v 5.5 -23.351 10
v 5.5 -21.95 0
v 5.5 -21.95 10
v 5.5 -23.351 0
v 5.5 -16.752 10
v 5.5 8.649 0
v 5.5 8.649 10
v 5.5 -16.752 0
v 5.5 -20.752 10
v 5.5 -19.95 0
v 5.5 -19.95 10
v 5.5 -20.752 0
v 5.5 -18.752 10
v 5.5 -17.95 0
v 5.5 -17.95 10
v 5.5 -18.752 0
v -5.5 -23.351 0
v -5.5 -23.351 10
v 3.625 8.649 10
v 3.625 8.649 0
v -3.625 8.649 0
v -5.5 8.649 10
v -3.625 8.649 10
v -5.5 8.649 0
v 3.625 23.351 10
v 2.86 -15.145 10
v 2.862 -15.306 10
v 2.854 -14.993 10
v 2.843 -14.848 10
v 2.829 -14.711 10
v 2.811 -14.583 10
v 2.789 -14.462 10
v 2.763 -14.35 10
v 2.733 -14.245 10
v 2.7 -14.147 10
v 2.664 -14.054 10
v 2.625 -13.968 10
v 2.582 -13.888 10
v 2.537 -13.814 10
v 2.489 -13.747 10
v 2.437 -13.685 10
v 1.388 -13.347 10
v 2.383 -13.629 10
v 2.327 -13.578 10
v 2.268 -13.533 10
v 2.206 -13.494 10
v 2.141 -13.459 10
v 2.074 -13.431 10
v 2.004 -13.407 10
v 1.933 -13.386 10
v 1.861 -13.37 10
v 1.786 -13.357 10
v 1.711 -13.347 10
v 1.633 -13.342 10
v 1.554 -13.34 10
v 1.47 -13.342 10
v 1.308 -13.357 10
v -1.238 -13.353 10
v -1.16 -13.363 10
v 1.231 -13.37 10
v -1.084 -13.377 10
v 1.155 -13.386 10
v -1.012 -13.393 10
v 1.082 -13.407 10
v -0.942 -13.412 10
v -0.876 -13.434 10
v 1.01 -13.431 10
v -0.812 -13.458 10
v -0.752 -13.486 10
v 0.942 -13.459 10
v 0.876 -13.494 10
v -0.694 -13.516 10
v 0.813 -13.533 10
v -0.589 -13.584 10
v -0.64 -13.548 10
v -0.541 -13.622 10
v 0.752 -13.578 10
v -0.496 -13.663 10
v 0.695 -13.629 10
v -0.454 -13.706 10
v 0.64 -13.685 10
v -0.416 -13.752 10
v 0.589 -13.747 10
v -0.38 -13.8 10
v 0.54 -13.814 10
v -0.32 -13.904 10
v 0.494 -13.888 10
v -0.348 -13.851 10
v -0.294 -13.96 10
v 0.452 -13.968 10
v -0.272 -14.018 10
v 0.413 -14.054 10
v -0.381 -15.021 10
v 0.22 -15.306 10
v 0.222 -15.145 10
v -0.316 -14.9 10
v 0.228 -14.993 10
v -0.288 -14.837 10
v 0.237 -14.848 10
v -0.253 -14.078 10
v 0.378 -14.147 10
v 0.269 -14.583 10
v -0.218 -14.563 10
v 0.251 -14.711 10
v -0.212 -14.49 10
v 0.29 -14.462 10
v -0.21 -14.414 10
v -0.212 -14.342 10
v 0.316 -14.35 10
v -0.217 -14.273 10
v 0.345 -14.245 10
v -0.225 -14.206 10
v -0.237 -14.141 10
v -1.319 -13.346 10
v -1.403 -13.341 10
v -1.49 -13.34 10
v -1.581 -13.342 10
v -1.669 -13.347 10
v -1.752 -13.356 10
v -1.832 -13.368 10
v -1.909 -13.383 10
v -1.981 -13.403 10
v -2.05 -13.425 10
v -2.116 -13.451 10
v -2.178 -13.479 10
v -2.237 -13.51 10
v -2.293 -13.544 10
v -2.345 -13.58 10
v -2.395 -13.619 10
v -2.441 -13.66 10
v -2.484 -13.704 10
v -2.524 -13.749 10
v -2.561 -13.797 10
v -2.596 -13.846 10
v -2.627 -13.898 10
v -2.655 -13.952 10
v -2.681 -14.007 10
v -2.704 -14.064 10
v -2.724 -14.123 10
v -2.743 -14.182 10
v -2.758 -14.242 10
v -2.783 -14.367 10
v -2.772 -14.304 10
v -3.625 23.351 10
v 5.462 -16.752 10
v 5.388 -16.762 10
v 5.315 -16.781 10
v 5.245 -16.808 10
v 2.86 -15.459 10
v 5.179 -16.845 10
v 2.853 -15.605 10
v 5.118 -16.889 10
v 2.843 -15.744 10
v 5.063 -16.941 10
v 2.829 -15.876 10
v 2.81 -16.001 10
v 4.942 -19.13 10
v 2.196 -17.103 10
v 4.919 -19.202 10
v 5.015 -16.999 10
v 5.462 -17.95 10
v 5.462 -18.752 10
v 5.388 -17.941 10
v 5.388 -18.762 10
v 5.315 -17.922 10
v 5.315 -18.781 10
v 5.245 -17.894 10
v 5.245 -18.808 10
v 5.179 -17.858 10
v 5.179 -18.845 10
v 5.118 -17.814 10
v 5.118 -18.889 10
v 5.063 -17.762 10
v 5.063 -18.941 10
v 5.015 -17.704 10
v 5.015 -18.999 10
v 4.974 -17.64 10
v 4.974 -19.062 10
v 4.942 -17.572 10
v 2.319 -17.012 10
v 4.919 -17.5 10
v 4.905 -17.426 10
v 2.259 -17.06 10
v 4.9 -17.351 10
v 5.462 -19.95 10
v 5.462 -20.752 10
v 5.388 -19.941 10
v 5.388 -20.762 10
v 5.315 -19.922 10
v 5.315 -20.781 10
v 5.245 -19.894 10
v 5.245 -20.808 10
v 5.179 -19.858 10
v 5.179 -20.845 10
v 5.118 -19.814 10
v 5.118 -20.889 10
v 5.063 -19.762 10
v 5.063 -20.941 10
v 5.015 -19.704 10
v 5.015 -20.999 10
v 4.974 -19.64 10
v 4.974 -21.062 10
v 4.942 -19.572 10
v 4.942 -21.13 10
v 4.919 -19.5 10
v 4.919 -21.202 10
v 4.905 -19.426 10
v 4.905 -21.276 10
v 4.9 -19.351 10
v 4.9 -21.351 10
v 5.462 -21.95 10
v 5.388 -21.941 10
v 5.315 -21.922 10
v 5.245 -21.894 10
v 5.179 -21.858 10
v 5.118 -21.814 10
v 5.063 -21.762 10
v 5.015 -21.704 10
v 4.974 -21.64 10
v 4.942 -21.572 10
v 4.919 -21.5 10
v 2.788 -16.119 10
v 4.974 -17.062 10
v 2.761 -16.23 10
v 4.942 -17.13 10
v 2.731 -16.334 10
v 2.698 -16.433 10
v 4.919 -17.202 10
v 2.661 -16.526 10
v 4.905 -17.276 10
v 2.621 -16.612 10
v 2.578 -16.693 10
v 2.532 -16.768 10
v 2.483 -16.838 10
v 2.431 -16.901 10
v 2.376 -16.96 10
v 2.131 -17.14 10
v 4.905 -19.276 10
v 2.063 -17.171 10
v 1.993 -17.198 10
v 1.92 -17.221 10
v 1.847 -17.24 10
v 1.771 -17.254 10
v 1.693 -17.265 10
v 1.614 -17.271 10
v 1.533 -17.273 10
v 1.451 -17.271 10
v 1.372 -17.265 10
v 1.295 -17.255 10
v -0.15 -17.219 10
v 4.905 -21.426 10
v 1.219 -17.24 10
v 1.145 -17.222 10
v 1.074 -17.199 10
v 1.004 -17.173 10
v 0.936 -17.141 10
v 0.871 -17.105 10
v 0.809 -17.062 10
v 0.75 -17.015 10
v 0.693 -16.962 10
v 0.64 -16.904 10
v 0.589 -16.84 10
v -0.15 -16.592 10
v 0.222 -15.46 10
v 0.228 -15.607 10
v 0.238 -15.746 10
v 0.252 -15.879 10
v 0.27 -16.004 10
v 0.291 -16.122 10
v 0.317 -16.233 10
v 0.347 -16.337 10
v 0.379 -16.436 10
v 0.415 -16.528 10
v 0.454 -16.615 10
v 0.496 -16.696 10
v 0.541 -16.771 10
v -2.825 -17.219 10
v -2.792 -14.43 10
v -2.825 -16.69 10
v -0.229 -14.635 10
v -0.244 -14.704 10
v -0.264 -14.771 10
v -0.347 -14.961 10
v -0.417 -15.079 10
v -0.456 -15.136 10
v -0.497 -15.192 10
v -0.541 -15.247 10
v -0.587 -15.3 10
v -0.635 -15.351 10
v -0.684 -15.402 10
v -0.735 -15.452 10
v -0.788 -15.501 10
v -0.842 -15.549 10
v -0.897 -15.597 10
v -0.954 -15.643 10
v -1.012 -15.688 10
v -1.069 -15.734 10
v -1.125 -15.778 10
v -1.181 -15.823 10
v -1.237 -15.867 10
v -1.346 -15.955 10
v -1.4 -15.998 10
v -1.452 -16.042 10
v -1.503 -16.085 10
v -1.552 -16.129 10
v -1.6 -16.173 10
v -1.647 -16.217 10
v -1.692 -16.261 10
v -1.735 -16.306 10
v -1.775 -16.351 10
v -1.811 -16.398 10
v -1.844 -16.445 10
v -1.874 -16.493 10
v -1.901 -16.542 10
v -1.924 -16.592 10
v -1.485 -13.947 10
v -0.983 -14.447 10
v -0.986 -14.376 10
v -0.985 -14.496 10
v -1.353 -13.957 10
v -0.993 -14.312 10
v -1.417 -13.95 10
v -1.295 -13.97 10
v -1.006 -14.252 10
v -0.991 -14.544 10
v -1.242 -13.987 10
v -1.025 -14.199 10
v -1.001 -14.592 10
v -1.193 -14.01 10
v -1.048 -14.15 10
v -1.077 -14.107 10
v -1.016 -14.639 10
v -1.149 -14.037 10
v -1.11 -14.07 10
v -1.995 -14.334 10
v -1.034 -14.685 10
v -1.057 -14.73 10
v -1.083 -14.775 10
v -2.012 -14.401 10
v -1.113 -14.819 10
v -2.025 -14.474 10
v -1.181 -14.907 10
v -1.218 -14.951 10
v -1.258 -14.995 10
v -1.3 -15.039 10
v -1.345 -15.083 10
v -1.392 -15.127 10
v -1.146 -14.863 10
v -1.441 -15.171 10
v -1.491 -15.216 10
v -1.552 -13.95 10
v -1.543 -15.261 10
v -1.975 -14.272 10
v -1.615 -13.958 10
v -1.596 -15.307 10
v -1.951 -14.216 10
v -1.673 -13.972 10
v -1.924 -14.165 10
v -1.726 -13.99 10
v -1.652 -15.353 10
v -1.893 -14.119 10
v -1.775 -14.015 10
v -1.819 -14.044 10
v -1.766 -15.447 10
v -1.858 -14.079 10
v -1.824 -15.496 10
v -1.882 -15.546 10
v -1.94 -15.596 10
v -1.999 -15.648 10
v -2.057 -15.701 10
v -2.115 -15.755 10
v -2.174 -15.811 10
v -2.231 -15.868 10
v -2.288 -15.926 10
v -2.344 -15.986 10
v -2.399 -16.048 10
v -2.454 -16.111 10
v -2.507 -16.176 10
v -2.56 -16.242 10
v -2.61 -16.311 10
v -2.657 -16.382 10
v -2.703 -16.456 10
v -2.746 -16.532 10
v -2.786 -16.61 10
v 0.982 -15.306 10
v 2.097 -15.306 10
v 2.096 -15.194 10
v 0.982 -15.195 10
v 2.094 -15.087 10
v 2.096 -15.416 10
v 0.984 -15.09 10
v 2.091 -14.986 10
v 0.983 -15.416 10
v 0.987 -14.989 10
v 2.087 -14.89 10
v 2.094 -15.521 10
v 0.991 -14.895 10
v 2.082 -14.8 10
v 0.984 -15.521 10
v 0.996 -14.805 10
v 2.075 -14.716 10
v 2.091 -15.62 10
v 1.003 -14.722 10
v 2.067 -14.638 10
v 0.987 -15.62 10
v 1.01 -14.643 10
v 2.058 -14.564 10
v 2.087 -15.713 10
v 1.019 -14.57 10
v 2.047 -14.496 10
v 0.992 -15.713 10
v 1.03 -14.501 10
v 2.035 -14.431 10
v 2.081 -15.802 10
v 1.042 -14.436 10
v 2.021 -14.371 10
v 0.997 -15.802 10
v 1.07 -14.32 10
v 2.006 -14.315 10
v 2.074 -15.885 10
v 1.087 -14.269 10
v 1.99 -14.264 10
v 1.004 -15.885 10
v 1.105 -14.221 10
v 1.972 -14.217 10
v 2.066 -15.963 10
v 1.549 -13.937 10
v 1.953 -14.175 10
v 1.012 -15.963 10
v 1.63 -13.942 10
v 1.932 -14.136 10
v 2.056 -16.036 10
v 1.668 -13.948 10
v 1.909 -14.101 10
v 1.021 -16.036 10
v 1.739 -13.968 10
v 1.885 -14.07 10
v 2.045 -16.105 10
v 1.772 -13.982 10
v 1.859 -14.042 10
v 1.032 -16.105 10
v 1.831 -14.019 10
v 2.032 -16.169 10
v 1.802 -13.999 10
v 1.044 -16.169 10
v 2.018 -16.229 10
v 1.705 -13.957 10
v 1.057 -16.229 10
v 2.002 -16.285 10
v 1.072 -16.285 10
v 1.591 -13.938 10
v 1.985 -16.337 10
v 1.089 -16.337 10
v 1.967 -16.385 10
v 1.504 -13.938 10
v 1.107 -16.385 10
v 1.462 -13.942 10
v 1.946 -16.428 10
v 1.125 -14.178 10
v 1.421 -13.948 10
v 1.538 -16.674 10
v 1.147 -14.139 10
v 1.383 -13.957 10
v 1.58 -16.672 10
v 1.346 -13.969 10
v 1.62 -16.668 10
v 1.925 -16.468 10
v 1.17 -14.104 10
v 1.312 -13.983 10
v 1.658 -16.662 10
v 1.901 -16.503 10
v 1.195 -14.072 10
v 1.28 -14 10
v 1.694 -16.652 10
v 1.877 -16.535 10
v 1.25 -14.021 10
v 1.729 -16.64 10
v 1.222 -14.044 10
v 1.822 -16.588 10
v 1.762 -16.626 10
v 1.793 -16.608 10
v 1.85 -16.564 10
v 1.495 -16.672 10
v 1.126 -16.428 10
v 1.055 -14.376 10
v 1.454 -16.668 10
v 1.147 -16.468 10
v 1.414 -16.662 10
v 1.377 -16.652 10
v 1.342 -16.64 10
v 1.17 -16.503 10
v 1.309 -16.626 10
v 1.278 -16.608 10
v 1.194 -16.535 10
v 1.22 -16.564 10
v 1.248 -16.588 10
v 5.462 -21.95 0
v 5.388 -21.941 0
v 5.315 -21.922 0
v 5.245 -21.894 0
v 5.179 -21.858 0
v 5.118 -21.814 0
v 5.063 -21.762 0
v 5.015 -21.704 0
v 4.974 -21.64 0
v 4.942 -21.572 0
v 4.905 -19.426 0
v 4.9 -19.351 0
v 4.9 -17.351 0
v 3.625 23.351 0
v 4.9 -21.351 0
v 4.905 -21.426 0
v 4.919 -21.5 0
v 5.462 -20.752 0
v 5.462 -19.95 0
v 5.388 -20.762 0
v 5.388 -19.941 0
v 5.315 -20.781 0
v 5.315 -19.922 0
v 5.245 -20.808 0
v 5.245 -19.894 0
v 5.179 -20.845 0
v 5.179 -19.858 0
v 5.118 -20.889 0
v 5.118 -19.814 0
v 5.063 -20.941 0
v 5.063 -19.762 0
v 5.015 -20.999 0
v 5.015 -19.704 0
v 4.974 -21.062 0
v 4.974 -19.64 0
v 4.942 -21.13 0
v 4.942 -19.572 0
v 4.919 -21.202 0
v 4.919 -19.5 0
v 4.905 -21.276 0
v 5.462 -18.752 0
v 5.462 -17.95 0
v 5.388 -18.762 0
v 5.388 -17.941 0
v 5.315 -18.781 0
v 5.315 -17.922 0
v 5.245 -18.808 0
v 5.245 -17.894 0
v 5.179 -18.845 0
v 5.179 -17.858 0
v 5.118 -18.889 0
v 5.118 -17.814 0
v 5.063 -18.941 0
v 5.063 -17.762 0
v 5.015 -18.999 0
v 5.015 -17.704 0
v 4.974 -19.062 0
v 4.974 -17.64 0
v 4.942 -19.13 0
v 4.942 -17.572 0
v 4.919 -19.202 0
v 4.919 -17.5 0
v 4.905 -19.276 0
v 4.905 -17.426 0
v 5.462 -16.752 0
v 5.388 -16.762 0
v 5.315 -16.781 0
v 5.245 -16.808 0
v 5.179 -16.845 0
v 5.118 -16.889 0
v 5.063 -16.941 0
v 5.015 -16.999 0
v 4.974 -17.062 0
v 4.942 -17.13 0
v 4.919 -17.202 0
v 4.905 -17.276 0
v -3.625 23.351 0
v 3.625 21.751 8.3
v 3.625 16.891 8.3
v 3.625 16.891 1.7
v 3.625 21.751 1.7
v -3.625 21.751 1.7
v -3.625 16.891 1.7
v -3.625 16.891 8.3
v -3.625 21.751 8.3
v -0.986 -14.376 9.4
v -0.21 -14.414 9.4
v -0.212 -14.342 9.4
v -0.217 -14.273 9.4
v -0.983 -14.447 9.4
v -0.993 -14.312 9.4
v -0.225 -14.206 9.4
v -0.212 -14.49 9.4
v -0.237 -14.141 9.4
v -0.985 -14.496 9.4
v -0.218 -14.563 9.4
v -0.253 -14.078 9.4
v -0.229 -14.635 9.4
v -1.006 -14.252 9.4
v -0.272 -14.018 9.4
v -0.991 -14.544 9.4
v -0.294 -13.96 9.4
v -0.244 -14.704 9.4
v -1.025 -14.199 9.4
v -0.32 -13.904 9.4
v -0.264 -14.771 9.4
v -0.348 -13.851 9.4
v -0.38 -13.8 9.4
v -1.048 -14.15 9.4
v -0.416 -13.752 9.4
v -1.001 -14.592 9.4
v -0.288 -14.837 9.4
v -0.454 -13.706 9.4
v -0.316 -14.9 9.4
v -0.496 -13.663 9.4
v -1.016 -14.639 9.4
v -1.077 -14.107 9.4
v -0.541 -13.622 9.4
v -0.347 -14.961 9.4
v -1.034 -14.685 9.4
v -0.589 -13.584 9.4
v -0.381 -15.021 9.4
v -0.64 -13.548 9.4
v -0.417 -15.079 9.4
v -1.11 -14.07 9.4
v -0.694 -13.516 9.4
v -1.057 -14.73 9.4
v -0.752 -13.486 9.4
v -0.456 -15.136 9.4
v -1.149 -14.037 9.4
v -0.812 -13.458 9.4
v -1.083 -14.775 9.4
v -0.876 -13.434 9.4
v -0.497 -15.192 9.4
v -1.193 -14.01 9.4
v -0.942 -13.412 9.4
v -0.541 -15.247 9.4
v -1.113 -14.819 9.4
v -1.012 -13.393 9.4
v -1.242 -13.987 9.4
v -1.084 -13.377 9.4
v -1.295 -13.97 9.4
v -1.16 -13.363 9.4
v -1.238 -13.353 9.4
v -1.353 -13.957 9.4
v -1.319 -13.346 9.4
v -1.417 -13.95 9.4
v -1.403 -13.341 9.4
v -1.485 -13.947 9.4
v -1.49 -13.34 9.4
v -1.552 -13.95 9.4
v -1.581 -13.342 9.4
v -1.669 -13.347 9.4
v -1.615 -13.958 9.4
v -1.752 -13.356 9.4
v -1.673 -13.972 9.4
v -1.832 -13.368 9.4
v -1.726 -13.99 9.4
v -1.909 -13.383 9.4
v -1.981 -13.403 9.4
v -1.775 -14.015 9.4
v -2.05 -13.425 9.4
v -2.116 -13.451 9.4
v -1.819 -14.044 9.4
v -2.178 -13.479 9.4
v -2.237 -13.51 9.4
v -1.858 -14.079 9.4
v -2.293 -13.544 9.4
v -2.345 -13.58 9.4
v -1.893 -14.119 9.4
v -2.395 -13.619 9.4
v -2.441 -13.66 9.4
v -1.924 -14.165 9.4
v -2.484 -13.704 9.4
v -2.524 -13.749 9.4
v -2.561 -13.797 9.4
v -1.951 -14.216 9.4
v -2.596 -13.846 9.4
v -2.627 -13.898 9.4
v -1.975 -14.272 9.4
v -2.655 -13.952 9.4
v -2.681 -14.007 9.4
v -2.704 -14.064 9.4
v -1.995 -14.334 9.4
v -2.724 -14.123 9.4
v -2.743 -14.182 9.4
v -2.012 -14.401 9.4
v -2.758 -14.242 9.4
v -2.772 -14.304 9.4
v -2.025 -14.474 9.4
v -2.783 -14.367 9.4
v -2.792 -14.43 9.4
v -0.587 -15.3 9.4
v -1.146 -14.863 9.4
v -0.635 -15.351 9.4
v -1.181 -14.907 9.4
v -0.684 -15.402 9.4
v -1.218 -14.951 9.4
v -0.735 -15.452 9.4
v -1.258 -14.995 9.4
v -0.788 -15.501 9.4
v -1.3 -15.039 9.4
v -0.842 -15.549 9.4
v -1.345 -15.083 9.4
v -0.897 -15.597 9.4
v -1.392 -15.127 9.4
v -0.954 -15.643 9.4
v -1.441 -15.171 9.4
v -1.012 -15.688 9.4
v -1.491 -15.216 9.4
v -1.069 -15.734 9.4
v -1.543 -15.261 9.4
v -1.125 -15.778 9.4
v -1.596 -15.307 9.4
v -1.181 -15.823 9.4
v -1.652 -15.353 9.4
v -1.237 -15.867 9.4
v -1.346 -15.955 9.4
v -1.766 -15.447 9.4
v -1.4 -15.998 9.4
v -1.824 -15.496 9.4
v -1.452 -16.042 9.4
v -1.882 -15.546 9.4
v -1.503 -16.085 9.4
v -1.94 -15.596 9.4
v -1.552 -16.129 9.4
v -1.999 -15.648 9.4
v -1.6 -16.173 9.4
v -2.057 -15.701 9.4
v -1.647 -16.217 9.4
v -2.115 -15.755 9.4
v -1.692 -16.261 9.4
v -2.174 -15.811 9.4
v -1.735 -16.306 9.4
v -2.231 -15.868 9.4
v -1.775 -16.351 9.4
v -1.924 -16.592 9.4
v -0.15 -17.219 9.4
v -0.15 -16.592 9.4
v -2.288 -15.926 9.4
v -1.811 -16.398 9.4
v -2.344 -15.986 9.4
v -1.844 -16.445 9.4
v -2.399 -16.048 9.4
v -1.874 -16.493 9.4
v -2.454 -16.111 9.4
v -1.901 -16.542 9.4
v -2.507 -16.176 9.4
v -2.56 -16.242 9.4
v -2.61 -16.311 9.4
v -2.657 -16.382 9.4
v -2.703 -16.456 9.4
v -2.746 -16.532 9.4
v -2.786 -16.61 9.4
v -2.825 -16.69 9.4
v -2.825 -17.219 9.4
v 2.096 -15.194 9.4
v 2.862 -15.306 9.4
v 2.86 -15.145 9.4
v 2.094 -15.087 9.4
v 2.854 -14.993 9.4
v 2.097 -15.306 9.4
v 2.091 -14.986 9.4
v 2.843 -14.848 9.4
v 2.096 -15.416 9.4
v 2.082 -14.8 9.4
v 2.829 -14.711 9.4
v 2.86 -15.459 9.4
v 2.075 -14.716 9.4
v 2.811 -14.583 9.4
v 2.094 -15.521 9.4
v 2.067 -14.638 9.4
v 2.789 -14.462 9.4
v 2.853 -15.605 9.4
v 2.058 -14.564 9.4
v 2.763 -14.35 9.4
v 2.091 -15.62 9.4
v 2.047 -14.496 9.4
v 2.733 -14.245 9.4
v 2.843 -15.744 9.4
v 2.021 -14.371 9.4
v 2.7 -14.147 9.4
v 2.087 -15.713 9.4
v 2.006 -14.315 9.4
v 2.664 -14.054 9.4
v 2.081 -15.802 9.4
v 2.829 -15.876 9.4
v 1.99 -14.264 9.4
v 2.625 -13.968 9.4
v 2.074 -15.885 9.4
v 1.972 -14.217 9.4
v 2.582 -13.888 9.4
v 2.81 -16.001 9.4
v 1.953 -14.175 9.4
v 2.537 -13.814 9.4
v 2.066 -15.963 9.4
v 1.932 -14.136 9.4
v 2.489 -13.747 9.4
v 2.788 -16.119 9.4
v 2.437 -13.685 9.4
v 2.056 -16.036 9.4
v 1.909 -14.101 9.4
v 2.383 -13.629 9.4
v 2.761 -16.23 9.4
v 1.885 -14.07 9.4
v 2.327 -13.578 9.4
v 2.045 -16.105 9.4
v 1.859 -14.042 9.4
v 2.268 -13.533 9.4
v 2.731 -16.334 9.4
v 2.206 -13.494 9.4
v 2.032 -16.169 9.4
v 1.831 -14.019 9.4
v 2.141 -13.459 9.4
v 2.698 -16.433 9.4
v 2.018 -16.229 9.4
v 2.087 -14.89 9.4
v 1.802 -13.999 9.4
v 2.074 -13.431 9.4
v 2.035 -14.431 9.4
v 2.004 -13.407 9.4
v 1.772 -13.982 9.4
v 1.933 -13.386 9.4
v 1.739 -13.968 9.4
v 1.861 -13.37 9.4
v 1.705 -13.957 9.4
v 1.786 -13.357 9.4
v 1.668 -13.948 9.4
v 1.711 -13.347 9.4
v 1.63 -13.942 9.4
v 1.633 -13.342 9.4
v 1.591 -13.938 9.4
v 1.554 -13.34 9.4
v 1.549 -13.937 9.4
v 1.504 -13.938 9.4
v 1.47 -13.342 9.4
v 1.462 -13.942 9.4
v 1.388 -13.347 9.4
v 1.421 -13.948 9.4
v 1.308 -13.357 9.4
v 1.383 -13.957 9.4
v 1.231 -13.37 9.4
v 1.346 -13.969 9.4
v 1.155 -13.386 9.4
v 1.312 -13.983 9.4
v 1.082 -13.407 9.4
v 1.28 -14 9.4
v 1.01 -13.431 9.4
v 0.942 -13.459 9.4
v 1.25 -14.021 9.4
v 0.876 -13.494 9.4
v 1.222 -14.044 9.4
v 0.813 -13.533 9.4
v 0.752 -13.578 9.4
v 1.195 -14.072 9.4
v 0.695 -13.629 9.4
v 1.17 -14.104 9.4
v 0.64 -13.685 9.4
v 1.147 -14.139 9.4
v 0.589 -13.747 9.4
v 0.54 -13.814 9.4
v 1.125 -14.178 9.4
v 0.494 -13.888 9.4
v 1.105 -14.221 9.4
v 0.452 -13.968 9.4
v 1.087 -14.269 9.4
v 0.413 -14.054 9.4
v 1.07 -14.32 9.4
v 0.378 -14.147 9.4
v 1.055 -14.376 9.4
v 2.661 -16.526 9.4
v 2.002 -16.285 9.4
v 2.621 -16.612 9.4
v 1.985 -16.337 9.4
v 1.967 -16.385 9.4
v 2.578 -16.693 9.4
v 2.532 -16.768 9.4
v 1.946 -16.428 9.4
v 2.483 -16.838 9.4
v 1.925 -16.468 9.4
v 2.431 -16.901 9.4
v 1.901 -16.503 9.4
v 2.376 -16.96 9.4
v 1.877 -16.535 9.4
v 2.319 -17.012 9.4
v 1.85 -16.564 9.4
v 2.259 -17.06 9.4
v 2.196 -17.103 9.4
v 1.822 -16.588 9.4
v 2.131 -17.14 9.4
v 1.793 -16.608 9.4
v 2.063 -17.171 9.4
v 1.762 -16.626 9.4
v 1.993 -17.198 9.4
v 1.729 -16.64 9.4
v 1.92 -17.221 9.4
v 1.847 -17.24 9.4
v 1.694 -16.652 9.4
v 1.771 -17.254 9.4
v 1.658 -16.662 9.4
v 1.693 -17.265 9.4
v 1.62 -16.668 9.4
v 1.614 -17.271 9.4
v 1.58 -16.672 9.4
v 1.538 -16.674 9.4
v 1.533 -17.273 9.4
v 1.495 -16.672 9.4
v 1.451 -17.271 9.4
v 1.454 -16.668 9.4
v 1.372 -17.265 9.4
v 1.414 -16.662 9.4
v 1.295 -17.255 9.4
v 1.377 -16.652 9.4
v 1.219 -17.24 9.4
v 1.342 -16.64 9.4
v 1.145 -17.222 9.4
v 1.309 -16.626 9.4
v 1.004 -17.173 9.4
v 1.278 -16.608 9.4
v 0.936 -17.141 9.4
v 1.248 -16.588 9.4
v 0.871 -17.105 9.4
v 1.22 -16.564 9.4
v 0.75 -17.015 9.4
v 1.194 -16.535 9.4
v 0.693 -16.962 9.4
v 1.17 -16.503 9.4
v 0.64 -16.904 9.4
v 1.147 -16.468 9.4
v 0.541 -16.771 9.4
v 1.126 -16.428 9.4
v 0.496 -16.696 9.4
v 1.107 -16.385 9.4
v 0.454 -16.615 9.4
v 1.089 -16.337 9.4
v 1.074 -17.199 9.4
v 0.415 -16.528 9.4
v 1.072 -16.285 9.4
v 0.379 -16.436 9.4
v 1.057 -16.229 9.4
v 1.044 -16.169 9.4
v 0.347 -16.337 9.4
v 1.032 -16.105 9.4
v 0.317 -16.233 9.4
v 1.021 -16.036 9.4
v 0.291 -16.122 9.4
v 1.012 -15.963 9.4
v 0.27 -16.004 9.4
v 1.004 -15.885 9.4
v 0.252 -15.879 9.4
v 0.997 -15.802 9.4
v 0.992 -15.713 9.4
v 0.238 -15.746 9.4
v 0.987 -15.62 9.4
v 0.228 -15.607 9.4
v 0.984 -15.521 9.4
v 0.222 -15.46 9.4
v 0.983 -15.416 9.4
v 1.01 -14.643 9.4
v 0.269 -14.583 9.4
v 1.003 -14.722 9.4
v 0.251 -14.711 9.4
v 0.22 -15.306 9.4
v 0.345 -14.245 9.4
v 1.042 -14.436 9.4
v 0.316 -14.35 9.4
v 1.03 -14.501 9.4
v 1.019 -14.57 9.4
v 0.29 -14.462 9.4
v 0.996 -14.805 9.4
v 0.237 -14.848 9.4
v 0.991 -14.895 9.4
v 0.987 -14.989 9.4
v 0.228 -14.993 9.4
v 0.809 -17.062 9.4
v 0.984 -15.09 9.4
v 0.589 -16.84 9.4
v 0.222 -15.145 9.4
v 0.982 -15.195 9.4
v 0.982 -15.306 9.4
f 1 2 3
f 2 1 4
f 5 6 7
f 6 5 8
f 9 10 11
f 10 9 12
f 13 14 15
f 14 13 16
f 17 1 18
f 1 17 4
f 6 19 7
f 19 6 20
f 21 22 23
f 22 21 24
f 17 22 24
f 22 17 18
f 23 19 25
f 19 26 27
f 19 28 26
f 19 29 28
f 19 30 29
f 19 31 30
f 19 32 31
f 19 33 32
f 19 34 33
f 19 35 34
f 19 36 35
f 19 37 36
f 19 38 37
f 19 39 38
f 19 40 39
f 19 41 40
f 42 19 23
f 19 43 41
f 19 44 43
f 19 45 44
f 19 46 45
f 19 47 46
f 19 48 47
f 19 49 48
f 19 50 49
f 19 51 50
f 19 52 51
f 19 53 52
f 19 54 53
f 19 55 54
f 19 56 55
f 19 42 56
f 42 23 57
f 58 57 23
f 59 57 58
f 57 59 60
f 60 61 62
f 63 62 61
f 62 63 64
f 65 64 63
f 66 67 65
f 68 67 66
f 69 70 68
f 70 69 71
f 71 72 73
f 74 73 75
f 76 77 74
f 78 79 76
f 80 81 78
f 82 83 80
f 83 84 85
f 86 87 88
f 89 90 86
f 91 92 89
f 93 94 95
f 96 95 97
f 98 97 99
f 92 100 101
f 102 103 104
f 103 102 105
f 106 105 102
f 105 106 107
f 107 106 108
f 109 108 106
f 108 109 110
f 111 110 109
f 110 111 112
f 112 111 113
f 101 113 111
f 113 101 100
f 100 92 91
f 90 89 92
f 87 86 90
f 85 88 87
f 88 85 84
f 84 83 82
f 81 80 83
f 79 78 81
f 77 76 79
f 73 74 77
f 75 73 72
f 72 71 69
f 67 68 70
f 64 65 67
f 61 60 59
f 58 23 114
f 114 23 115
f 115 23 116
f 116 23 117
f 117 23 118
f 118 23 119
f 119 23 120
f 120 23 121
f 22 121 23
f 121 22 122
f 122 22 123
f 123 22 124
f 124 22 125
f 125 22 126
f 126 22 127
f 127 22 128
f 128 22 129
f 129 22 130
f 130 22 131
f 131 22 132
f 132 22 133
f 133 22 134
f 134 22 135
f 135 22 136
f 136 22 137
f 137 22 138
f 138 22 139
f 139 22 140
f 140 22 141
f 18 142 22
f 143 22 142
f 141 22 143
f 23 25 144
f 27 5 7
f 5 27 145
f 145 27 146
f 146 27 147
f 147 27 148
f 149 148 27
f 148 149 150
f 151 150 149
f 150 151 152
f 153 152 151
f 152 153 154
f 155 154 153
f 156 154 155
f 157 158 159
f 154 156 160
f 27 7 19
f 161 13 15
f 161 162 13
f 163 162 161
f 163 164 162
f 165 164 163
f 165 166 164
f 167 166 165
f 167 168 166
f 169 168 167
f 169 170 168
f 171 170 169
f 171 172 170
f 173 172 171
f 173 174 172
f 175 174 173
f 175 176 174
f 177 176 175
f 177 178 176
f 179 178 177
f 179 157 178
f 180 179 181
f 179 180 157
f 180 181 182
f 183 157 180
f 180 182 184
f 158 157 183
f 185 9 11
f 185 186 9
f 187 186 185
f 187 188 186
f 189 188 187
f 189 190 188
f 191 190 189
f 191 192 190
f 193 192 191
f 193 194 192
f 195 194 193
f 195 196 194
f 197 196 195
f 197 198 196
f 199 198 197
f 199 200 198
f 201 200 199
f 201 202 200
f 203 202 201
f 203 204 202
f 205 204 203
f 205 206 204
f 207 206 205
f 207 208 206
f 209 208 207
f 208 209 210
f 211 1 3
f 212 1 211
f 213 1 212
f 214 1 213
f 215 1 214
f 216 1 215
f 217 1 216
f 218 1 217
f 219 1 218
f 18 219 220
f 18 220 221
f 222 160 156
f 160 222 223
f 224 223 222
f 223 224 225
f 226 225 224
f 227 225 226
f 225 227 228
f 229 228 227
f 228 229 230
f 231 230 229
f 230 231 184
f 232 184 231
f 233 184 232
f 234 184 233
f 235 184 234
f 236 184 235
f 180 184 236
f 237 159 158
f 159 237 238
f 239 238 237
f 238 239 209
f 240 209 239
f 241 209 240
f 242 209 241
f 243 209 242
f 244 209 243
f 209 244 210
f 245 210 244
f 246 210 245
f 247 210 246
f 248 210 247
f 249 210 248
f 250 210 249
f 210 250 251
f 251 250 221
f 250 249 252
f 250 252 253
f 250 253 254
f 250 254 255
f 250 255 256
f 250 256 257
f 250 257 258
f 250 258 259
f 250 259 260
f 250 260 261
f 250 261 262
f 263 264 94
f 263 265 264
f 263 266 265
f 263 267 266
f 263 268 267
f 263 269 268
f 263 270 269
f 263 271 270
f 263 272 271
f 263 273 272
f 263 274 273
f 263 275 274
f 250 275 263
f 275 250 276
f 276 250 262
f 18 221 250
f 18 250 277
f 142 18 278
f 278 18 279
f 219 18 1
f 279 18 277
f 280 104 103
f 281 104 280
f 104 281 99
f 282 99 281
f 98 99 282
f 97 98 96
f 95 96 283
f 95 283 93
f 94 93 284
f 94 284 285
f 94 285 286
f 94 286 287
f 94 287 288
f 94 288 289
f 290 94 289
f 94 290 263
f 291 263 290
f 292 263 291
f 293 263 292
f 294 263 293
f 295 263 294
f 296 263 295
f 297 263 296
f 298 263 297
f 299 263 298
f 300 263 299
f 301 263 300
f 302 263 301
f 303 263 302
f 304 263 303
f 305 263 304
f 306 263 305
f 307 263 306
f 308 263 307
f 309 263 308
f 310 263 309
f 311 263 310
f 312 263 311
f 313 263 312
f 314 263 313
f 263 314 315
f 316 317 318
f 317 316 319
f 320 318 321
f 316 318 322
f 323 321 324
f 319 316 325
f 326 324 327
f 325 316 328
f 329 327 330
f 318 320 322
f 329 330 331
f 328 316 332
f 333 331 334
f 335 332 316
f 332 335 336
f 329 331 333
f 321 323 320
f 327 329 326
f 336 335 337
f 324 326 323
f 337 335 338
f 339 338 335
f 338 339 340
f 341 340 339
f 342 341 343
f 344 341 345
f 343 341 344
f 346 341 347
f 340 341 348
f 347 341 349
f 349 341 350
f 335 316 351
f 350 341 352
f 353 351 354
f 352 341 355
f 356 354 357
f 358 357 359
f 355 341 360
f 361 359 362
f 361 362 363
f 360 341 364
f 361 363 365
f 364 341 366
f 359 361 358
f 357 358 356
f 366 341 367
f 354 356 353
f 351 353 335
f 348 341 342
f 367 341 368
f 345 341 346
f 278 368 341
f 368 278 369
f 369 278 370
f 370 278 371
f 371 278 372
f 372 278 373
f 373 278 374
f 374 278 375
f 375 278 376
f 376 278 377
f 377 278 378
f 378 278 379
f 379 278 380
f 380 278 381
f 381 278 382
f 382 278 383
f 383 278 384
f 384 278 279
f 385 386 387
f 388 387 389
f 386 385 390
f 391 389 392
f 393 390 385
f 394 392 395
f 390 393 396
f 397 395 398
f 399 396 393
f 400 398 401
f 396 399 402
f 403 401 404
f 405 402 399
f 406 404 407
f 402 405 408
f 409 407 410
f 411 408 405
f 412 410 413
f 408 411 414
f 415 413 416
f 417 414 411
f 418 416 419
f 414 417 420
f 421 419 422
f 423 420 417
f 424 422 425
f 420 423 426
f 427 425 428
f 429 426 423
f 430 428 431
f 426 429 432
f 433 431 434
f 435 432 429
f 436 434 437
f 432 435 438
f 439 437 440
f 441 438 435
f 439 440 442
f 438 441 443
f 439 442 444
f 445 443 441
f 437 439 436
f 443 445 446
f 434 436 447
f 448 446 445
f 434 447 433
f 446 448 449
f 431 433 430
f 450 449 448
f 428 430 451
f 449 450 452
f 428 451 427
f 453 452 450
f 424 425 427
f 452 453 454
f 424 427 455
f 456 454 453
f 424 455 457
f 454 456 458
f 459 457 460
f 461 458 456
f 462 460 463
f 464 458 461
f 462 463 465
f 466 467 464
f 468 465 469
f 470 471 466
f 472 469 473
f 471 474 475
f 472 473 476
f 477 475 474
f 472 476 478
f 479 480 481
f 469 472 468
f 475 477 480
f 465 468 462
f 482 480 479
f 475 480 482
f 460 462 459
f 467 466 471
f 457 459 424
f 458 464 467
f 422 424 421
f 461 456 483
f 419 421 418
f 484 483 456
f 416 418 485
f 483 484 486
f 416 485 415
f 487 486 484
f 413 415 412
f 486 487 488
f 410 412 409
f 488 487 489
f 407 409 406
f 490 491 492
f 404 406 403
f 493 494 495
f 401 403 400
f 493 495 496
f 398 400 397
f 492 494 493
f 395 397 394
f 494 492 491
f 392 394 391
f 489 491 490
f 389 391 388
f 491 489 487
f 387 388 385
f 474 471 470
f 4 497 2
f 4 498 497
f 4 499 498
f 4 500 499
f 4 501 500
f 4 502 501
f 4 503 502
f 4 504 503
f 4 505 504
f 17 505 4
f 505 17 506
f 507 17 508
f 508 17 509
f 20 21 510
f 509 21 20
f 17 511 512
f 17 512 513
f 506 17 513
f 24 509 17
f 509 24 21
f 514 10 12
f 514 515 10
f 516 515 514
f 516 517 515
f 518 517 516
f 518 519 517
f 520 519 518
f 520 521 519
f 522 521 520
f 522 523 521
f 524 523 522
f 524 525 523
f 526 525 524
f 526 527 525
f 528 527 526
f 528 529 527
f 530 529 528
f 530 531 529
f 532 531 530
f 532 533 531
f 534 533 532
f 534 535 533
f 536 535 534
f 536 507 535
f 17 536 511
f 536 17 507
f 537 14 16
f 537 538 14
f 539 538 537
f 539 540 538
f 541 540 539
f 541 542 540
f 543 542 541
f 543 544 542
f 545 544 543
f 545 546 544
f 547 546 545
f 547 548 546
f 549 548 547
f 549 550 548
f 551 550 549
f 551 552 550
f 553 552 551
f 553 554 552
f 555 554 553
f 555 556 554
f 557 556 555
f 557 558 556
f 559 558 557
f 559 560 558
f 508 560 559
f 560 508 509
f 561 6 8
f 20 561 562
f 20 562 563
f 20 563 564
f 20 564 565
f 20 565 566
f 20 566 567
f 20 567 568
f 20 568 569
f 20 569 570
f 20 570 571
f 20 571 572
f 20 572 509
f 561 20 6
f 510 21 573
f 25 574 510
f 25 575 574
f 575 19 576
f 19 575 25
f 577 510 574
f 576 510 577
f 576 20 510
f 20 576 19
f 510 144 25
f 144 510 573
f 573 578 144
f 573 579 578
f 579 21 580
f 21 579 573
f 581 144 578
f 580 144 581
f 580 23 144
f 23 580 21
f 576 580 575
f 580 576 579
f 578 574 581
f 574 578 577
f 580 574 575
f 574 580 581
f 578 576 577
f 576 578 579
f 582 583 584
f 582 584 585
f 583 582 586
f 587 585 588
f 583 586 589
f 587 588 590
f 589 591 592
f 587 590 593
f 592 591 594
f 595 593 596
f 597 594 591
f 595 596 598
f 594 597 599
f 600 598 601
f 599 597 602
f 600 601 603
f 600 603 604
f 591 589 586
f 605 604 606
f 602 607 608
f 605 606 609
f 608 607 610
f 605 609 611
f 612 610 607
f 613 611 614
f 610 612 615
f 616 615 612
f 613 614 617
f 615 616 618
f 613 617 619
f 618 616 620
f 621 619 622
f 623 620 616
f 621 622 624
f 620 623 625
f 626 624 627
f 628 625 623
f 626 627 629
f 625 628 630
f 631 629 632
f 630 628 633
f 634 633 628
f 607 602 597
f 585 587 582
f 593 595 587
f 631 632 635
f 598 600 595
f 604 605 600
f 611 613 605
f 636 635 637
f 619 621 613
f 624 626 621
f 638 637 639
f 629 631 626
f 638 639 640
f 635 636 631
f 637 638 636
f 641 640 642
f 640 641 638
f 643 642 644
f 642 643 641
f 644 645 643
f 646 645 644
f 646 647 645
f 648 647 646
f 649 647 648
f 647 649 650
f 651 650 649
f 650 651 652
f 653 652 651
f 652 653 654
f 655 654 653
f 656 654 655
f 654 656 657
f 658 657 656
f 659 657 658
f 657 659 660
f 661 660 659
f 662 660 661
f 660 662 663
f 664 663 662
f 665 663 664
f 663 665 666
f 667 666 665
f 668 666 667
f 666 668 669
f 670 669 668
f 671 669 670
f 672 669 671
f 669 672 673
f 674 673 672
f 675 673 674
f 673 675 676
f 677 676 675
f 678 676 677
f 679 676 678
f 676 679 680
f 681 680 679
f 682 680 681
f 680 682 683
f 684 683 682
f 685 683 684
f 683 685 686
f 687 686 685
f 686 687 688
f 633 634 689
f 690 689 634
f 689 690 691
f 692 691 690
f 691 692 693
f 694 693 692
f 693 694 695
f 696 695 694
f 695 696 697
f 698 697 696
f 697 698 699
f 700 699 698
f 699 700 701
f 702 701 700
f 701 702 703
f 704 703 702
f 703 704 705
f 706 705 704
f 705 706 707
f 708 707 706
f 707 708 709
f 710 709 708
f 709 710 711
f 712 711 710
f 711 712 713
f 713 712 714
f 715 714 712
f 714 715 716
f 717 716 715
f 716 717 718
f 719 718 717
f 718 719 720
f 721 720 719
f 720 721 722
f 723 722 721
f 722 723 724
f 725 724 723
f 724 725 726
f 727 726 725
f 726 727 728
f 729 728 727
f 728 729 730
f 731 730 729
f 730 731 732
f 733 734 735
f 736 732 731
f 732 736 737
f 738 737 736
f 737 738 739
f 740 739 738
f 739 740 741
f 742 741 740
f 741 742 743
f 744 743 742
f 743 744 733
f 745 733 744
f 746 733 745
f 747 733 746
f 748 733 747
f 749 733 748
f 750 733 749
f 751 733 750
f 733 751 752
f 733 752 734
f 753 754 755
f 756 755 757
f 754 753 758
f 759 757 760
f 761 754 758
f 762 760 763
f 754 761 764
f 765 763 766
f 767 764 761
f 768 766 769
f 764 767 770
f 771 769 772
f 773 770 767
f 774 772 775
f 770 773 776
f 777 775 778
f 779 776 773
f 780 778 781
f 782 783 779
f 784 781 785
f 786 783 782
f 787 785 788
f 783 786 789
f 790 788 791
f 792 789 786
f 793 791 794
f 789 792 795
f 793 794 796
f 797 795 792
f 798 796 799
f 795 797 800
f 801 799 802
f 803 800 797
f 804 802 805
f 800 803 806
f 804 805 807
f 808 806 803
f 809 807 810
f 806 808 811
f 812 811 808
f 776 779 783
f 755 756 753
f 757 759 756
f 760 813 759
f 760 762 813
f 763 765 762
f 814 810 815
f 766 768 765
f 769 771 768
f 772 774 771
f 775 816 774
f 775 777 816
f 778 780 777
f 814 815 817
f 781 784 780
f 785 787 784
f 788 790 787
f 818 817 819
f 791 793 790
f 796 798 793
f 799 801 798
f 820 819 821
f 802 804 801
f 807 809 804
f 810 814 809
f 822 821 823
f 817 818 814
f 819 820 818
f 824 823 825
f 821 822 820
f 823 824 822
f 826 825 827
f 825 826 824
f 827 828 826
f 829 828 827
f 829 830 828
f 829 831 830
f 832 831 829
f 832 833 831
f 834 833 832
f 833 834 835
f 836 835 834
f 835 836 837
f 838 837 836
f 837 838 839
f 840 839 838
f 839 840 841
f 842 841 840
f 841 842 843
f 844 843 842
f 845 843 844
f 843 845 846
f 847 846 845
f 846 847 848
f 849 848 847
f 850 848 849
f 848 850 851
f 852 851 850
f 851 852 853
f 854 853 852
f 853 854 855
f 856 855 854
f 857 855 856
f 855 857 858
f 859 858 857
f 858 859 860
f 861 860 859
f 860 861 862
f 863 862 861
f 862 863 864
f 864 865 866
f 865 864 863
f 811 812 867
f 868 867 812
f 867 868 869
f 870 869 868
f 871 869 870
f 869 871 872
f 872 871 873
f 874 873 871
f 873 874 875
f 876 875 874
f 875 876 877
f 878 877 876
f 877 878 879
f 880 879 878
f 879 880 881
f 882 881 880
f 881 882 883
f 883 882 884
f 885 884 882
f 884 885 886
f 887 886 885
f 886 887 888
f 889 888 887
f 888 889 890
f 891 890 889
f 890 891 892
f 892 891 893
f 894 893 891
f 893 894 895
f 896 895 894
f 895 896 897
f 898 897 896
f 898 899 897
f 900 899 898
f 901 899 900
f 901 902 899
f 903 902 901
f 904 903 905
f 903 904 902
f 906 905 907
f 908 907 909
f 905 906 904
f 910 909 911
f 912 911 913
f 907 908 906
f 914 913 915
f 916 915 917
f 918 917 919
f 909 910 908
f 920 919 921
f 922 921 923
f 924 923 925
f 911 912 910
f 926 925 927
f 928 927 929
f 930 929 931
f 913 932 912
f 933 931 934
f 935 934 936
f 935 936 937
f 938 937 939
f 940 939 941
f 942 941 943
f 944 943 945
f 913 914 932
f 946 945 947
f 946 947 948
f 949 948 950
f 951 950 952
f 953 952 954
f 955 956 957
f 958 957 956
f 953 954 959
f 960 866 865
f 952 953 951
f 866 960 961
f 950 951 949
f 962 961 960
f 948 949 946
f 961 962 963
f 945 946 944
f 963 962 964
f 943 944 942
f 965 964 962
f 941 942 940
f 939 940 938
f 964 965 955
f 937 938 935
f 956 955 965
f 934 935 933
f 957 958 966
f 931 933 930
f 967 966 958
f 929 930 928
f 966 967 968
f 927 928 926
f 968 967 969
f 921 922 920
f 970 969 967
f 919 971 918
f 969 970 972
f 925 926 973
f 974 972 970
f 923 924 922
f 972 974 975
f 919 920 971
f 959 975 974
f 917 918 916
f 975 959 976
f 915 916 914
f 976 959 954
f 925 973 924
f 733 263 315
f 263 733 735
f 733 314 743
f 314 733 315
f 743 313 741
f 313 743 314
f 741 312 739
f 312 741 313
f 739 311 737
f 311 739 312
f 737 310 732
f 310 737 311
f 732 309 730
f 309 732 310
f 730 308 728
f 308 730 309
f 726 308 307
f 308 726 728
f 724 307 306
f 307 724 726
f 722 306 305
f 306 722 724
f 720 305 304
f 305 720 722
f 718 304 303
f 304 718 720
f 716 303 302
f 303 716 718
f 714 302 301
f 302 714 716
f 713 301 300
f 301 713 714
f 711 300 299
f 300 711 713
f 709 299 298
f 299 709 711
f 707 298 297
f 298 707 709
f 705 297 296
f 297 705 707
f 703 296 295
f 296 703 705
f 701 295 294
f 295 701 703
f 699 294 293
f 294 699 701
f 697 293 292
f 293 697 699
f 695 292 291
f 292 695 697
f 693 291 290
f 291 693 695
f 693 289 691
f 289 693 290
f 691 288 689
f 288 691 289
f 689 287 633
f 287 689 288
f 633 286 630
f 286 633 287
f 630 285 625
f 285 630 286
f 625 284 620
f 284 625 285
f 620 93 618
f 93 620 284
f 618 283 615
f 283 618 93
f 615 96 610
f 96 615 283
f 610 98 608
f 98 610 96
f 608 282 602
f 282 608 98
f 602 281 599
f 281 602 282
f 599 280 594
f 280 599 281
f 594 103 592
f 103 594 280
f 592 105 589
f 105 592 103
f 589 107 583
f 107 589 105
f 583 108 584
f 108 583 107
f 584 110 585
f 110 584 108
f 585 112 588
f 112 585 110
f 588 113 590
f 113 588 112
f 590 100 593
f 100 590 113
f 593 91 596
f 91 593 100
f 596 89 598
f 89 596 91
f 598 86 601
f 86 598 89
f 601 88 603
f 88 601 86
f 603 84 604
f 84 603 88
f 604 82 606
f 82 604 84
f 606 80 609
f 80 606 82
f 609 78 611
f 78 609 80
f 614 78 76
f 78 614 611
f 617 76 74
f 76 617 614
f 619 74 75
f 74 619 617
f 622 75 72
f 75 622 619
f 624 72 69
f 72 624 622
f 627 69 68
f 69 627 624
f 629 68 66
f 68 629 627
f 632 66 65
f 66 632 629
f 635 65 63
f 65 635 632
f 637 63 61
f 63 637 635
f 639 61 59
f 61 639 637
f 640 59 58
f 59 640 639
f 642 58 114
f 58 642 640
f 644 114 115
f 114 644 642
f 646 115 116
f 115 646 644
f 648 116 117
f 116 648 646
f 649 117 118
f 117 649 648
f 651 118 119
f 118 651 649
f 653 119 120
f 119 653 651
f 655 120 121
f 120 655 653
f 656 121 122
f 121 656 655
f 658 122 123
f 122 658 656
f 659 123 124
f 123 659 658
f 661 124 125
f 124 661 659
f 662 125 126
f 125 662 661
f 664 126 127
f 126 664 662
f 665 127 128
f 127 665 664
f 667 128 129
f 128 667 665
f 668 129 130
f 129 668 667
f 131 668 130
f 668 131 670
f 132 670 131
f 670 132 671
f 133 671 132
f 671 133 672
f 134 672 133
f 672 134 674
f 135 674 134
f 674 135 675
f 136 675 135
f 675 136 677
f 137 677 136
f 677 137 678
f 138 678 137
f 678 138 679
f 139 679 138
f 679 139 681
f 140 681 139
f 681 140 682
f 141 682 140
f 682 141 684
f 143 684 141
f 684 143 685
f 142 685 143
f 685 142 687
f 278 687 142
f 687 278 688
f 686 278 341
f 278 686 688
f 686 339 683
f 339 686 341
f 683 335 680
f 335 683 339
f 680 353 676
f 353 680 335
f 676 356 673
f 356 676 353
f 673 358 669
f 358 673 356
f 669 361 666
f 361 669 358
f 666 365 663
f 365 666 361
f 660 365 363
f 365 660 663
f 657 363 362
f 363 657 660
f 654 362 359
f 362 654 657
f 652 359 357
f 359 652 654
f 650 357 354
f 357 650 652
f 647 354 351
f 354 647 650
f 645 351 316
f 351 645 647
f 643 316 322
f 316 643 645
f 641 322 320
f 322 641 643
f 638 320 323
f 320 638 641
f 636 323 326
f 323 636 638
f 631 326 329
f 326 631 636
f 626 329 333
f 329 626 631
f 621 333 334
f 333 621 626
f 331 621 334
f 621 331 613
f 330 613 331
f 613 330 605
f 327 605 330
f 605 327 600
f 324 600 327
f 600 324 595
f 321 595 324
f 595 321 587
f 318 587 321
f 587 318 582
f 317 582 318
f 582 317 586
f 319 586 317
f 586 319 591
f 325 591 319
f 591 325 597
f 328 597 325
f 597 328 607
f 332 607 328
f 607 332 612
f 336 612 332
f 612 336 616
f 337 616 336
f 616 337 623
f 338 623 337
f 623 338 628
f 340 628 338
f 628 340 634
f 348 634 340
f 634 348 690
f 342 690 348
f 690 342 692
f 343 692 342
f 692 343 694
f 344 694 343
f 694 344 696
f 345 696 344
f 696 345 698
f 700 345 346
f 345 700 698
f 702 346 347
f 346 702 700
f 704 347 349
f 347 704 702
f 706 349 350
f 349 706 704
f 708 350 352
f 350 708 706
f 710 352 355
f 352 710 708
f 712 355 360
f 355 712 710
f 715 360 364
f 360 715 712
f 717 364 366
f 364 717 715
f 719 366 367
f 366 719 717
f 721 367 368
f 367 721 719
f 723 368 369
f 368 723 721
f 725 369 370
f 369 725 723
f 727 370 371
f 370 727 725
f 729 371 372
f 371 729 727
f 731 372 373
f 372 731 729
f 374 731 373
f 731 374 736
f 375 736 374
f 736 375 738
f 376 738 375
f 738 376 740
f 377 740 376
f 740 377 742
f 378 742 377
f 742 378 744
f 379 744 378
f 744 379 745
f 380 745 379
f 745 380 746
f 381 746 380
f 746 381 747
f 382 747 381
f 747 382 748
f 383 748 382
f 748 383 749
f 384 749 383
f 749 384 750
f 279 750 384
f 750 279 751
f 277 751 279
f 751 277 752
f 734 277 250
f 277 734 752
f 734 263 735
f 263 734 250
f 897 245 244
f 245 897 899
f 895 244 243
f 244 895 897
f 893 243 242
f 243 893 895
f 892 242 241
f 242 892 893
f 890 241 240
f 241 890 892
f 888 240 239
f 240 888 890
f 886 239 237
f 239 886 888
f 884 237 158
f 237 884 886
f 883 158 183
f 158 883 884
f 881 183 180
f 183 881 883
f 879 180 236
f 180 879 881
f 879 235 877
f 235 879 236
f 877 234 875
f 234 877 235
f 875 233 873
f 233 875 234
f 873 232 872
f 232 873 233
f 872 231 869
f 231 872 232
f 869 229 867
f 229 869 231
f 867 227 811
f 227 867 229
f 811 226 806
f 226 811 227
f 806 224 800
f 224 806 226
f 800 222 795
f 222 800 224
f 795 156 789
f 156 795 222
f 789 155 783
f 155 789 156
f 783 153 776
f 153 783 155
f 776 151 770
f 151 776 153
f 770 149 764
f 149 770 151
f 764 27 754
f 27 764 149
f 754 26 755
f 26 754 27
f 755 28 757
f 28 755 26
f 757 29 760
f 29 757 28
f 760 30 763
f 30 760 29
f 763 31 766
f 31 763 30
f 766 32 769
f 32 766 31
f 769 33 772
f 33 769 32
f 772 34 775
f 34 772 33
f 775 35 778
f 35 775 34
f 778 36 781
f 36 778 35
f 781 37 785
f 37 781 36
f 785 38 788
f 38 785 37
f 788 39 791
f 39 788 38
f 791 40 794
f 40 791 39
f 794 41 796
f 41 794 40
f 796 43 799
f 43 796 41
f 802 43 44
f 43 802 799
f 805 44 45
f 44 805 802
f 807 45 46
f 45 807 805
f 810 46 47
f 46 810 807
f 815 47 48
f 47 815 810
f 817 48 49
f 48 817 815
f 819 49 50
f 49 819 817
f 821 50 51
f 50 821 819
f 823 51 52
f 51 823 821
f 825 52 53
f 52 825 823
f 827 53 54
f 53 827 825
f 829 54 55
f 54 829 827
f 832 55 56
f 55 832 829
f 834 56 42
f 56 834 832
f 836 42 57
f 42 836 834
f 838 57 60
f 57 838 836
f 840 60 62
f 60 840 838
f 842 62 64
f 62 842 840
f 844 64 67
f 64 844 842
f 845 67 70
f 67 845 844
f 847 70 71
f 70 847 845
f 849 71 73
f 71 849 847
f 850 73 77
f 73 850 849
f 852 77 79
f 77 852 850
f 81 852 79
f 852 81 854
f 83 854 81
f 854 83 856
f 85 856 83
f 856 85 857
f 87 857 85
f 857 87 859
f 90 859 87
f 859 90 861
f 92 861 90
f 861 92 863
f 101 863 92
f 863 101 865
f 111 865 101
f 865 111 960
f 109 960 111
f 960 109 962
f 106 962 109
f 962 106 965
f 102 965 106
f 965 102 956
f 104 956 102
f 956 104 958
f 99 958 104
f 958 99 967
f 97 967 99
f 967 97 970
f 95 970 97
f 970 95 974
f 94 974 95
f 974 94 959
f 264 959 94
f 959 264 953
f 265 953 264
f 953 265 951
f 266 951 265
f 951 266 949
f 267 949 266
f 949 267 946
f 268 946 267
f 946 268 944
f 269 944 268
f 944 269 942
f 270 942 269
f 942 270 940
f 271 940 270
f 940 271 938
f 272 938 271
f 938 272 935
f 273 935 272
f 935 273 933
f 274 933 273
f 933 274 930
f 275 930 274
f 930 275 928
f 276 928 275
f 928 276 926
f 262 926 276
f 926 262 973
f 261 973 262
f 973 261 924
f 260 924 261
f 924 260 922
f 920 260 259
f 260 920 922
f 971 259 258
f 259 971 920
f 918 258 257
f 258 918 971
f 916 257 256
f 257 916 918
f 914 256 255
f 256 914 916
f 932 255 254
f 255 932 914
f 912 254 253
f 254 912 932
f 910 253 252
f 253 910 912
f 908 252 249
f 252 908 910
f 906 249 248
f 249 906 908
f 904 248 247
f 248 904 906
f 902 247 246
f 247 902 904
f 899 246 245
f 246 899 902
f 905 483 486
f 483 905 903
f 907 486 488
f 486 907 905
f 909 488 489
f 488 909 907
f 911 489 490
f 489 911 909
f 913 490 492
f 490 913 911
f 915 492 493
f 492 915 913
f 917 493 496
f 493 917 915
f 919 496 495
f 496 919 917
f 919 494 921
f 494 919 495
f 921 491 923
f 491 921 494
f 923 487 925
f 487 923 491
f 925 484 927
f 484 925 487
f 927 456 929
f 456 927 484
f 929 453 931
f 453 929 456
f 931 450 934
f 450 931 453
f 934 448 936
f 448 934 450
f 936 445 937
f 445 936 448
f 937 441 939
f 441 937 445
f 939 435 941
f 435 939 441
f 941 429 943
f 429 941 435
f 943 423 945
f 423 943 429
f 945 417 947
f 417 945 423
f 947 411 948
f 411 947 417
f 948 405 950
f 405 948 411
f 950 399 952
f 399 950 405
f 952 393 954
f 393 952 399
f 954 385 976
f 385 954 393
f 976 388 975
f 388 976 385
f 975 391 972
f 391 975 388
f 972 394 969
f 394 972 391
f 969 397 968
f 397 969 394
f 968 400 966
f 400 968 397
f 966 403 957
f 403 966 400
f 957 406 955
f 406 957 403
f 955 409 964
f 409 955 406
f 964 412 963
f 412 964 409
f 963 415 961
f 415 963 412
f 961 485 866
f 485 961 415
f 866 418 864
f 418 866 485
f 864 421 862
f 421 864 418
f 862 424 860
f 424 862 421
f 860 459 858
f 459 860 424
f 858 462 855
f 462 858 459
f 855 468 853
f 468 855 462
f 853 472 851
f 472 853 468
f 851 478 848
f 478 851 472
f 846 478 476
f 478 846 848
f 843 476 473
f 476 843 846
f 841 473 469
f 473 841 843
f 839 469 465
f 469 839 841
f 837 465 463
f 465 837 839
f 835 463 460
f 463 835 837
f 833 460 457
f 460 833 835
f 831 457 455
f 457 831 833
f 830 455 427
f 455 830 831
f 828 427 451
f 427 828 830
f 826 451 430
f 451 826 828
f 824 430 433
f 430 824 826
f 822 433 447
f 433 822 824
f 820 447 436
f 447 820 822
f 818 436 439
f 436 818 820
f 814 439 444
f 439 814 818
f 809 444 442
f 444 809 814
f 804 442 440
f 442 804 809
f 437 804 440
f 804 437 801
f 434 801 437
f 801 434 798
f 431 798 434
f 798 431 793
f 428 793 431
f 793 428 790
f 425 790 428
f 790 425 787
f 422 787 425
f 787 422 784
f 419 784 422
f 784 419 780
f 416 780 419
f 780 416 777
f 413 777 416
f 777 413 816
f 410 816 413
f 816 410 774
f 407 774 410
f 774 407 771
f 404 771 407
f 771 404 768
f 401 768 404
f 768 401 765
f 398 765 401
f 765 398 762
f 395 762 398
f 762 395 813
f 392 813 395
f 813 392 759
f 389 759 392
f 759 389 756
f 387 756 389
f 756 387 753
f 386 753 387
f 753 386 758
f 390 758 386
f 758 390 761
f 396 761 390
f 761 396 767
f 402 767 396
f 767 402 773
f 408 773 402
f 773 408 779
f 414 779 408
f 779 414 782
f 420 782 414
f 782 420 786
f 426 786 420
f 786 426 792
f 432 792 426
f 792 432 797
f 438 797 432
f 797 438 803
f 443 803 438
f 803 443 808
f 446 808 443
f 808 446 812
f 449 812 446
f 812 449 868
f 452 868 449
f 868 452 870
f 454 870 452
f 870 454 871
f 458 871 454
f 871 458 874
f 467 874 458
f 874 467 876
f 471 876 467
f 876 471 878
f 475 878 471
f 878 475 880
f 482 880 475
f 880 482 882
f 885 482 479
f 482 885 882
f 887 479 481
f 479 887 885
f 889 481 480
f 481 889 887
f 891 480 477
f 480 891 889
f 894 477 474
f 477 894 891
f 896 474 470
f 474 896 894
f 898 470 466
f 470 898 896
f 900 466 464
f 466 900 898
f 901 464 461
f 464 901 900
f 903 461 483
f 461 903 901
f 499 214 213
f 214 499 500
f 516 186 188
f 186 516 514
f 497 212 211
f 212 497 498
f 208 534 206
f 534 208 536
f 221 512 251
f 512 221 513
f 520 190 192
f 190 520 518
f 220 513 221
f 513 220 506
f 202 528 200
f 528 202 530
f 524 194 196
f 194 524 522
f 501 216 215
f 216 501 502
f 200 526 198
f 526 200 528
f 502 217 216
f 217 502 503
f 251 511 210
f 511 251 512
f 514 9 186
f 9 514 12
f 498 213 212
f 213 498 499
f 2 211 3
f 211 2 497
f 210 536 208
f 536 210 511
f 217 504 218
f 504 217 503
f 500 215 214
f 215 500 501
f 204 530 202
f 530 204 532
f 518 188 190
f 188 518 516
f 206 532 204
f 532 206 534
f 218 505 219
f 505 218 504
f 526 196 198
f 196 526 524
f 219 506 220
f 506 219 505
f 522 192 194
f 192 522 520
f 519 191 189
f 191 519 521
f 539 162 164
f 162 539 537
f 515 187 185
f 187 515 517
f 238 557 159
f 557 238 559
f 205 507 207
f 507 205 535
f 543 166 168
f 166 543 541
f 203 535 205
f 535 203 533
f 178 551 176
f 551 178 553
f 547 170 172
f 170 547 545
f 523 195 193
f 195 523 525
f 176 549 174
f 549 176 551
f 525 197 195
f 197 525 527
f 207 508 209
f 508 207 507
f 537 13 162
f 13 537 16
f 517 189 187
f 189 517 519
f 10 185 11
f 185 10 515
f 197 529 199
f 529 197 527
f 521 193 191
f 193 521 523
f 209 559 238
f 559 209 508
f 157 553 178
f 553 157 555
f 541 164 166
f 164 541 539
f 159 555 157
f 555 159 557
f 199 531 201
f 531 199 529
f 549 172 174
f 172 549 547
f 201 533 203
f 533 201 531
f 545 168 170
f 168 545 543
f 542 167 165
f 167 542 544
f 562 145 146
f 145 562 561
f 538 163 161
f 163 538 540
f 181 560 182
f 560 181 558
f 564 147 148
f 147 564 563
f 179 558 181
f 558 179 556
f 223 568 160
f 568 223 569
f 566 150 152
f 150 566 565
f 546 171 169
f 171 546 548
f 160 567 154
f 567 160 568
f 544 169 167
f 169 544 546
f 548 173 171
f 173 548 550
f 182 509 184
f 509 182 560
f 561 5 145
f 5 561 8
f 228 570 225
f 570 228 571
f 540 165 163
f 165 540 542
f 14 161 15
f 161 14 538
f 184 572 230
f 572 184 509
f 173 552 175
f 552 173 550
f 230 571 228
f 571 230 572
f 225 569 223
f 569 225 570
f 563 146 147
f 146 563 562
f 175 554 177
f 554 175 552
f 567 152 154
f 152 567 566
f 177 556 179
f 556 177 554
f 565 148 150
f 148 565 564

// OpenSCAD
$fn = 50;

difference() {
	union() {
		translate(v = [0, 8.64875, 0]) {
			rotate(a = [90, 0, 0]) {
				difference() {
					union() {
						translate(v = [-5.5, 0, 0]) {
							cube(size = [11.0, 10.0, 32.0]);
						}
						translate(v = [-3.625, 0, -14.702499999999999]) {
							cube(size = [7.25, 10.0, 14.802499999999998]);
						}
					}
					union() {
						translate(v = [-3.725, 1.7000000000000002, -13.1025]) {
							cube(size = [7.45, 6.6, 4.859999999999999]);
						}
						translate(v = [0, 9.4, 24.0]) {
							rotate(a = [-90, 0, 0]) {
								linear_extrude(height = 0.7) {
									text(font = "Arial:style=Bold", halign = "center", size = 4.0, text = "20", valign = "center");
								}
							}
						}
						translate(v = [5.5, 10.1, 30.0]) {
							rotate(a = [90, 0, 0]) {
								cylinder(h = 10.2, r = 0.6);
							}
						}
						translate(v = [5.5, 10.1, 28.0]) {
							rotate(a = [90, 0, 0]) {
								cylinder(h = 10.2, r = 0.6);
							}
						}
						translate(v = [5.5, 10.1, 26.0]) {
							rotate(a = [90, 0, 0]) {
								cylinder(h = 10.2, r = 0.6);
							}
						}
					}
				}
			}
		}
	}
	union();
}
